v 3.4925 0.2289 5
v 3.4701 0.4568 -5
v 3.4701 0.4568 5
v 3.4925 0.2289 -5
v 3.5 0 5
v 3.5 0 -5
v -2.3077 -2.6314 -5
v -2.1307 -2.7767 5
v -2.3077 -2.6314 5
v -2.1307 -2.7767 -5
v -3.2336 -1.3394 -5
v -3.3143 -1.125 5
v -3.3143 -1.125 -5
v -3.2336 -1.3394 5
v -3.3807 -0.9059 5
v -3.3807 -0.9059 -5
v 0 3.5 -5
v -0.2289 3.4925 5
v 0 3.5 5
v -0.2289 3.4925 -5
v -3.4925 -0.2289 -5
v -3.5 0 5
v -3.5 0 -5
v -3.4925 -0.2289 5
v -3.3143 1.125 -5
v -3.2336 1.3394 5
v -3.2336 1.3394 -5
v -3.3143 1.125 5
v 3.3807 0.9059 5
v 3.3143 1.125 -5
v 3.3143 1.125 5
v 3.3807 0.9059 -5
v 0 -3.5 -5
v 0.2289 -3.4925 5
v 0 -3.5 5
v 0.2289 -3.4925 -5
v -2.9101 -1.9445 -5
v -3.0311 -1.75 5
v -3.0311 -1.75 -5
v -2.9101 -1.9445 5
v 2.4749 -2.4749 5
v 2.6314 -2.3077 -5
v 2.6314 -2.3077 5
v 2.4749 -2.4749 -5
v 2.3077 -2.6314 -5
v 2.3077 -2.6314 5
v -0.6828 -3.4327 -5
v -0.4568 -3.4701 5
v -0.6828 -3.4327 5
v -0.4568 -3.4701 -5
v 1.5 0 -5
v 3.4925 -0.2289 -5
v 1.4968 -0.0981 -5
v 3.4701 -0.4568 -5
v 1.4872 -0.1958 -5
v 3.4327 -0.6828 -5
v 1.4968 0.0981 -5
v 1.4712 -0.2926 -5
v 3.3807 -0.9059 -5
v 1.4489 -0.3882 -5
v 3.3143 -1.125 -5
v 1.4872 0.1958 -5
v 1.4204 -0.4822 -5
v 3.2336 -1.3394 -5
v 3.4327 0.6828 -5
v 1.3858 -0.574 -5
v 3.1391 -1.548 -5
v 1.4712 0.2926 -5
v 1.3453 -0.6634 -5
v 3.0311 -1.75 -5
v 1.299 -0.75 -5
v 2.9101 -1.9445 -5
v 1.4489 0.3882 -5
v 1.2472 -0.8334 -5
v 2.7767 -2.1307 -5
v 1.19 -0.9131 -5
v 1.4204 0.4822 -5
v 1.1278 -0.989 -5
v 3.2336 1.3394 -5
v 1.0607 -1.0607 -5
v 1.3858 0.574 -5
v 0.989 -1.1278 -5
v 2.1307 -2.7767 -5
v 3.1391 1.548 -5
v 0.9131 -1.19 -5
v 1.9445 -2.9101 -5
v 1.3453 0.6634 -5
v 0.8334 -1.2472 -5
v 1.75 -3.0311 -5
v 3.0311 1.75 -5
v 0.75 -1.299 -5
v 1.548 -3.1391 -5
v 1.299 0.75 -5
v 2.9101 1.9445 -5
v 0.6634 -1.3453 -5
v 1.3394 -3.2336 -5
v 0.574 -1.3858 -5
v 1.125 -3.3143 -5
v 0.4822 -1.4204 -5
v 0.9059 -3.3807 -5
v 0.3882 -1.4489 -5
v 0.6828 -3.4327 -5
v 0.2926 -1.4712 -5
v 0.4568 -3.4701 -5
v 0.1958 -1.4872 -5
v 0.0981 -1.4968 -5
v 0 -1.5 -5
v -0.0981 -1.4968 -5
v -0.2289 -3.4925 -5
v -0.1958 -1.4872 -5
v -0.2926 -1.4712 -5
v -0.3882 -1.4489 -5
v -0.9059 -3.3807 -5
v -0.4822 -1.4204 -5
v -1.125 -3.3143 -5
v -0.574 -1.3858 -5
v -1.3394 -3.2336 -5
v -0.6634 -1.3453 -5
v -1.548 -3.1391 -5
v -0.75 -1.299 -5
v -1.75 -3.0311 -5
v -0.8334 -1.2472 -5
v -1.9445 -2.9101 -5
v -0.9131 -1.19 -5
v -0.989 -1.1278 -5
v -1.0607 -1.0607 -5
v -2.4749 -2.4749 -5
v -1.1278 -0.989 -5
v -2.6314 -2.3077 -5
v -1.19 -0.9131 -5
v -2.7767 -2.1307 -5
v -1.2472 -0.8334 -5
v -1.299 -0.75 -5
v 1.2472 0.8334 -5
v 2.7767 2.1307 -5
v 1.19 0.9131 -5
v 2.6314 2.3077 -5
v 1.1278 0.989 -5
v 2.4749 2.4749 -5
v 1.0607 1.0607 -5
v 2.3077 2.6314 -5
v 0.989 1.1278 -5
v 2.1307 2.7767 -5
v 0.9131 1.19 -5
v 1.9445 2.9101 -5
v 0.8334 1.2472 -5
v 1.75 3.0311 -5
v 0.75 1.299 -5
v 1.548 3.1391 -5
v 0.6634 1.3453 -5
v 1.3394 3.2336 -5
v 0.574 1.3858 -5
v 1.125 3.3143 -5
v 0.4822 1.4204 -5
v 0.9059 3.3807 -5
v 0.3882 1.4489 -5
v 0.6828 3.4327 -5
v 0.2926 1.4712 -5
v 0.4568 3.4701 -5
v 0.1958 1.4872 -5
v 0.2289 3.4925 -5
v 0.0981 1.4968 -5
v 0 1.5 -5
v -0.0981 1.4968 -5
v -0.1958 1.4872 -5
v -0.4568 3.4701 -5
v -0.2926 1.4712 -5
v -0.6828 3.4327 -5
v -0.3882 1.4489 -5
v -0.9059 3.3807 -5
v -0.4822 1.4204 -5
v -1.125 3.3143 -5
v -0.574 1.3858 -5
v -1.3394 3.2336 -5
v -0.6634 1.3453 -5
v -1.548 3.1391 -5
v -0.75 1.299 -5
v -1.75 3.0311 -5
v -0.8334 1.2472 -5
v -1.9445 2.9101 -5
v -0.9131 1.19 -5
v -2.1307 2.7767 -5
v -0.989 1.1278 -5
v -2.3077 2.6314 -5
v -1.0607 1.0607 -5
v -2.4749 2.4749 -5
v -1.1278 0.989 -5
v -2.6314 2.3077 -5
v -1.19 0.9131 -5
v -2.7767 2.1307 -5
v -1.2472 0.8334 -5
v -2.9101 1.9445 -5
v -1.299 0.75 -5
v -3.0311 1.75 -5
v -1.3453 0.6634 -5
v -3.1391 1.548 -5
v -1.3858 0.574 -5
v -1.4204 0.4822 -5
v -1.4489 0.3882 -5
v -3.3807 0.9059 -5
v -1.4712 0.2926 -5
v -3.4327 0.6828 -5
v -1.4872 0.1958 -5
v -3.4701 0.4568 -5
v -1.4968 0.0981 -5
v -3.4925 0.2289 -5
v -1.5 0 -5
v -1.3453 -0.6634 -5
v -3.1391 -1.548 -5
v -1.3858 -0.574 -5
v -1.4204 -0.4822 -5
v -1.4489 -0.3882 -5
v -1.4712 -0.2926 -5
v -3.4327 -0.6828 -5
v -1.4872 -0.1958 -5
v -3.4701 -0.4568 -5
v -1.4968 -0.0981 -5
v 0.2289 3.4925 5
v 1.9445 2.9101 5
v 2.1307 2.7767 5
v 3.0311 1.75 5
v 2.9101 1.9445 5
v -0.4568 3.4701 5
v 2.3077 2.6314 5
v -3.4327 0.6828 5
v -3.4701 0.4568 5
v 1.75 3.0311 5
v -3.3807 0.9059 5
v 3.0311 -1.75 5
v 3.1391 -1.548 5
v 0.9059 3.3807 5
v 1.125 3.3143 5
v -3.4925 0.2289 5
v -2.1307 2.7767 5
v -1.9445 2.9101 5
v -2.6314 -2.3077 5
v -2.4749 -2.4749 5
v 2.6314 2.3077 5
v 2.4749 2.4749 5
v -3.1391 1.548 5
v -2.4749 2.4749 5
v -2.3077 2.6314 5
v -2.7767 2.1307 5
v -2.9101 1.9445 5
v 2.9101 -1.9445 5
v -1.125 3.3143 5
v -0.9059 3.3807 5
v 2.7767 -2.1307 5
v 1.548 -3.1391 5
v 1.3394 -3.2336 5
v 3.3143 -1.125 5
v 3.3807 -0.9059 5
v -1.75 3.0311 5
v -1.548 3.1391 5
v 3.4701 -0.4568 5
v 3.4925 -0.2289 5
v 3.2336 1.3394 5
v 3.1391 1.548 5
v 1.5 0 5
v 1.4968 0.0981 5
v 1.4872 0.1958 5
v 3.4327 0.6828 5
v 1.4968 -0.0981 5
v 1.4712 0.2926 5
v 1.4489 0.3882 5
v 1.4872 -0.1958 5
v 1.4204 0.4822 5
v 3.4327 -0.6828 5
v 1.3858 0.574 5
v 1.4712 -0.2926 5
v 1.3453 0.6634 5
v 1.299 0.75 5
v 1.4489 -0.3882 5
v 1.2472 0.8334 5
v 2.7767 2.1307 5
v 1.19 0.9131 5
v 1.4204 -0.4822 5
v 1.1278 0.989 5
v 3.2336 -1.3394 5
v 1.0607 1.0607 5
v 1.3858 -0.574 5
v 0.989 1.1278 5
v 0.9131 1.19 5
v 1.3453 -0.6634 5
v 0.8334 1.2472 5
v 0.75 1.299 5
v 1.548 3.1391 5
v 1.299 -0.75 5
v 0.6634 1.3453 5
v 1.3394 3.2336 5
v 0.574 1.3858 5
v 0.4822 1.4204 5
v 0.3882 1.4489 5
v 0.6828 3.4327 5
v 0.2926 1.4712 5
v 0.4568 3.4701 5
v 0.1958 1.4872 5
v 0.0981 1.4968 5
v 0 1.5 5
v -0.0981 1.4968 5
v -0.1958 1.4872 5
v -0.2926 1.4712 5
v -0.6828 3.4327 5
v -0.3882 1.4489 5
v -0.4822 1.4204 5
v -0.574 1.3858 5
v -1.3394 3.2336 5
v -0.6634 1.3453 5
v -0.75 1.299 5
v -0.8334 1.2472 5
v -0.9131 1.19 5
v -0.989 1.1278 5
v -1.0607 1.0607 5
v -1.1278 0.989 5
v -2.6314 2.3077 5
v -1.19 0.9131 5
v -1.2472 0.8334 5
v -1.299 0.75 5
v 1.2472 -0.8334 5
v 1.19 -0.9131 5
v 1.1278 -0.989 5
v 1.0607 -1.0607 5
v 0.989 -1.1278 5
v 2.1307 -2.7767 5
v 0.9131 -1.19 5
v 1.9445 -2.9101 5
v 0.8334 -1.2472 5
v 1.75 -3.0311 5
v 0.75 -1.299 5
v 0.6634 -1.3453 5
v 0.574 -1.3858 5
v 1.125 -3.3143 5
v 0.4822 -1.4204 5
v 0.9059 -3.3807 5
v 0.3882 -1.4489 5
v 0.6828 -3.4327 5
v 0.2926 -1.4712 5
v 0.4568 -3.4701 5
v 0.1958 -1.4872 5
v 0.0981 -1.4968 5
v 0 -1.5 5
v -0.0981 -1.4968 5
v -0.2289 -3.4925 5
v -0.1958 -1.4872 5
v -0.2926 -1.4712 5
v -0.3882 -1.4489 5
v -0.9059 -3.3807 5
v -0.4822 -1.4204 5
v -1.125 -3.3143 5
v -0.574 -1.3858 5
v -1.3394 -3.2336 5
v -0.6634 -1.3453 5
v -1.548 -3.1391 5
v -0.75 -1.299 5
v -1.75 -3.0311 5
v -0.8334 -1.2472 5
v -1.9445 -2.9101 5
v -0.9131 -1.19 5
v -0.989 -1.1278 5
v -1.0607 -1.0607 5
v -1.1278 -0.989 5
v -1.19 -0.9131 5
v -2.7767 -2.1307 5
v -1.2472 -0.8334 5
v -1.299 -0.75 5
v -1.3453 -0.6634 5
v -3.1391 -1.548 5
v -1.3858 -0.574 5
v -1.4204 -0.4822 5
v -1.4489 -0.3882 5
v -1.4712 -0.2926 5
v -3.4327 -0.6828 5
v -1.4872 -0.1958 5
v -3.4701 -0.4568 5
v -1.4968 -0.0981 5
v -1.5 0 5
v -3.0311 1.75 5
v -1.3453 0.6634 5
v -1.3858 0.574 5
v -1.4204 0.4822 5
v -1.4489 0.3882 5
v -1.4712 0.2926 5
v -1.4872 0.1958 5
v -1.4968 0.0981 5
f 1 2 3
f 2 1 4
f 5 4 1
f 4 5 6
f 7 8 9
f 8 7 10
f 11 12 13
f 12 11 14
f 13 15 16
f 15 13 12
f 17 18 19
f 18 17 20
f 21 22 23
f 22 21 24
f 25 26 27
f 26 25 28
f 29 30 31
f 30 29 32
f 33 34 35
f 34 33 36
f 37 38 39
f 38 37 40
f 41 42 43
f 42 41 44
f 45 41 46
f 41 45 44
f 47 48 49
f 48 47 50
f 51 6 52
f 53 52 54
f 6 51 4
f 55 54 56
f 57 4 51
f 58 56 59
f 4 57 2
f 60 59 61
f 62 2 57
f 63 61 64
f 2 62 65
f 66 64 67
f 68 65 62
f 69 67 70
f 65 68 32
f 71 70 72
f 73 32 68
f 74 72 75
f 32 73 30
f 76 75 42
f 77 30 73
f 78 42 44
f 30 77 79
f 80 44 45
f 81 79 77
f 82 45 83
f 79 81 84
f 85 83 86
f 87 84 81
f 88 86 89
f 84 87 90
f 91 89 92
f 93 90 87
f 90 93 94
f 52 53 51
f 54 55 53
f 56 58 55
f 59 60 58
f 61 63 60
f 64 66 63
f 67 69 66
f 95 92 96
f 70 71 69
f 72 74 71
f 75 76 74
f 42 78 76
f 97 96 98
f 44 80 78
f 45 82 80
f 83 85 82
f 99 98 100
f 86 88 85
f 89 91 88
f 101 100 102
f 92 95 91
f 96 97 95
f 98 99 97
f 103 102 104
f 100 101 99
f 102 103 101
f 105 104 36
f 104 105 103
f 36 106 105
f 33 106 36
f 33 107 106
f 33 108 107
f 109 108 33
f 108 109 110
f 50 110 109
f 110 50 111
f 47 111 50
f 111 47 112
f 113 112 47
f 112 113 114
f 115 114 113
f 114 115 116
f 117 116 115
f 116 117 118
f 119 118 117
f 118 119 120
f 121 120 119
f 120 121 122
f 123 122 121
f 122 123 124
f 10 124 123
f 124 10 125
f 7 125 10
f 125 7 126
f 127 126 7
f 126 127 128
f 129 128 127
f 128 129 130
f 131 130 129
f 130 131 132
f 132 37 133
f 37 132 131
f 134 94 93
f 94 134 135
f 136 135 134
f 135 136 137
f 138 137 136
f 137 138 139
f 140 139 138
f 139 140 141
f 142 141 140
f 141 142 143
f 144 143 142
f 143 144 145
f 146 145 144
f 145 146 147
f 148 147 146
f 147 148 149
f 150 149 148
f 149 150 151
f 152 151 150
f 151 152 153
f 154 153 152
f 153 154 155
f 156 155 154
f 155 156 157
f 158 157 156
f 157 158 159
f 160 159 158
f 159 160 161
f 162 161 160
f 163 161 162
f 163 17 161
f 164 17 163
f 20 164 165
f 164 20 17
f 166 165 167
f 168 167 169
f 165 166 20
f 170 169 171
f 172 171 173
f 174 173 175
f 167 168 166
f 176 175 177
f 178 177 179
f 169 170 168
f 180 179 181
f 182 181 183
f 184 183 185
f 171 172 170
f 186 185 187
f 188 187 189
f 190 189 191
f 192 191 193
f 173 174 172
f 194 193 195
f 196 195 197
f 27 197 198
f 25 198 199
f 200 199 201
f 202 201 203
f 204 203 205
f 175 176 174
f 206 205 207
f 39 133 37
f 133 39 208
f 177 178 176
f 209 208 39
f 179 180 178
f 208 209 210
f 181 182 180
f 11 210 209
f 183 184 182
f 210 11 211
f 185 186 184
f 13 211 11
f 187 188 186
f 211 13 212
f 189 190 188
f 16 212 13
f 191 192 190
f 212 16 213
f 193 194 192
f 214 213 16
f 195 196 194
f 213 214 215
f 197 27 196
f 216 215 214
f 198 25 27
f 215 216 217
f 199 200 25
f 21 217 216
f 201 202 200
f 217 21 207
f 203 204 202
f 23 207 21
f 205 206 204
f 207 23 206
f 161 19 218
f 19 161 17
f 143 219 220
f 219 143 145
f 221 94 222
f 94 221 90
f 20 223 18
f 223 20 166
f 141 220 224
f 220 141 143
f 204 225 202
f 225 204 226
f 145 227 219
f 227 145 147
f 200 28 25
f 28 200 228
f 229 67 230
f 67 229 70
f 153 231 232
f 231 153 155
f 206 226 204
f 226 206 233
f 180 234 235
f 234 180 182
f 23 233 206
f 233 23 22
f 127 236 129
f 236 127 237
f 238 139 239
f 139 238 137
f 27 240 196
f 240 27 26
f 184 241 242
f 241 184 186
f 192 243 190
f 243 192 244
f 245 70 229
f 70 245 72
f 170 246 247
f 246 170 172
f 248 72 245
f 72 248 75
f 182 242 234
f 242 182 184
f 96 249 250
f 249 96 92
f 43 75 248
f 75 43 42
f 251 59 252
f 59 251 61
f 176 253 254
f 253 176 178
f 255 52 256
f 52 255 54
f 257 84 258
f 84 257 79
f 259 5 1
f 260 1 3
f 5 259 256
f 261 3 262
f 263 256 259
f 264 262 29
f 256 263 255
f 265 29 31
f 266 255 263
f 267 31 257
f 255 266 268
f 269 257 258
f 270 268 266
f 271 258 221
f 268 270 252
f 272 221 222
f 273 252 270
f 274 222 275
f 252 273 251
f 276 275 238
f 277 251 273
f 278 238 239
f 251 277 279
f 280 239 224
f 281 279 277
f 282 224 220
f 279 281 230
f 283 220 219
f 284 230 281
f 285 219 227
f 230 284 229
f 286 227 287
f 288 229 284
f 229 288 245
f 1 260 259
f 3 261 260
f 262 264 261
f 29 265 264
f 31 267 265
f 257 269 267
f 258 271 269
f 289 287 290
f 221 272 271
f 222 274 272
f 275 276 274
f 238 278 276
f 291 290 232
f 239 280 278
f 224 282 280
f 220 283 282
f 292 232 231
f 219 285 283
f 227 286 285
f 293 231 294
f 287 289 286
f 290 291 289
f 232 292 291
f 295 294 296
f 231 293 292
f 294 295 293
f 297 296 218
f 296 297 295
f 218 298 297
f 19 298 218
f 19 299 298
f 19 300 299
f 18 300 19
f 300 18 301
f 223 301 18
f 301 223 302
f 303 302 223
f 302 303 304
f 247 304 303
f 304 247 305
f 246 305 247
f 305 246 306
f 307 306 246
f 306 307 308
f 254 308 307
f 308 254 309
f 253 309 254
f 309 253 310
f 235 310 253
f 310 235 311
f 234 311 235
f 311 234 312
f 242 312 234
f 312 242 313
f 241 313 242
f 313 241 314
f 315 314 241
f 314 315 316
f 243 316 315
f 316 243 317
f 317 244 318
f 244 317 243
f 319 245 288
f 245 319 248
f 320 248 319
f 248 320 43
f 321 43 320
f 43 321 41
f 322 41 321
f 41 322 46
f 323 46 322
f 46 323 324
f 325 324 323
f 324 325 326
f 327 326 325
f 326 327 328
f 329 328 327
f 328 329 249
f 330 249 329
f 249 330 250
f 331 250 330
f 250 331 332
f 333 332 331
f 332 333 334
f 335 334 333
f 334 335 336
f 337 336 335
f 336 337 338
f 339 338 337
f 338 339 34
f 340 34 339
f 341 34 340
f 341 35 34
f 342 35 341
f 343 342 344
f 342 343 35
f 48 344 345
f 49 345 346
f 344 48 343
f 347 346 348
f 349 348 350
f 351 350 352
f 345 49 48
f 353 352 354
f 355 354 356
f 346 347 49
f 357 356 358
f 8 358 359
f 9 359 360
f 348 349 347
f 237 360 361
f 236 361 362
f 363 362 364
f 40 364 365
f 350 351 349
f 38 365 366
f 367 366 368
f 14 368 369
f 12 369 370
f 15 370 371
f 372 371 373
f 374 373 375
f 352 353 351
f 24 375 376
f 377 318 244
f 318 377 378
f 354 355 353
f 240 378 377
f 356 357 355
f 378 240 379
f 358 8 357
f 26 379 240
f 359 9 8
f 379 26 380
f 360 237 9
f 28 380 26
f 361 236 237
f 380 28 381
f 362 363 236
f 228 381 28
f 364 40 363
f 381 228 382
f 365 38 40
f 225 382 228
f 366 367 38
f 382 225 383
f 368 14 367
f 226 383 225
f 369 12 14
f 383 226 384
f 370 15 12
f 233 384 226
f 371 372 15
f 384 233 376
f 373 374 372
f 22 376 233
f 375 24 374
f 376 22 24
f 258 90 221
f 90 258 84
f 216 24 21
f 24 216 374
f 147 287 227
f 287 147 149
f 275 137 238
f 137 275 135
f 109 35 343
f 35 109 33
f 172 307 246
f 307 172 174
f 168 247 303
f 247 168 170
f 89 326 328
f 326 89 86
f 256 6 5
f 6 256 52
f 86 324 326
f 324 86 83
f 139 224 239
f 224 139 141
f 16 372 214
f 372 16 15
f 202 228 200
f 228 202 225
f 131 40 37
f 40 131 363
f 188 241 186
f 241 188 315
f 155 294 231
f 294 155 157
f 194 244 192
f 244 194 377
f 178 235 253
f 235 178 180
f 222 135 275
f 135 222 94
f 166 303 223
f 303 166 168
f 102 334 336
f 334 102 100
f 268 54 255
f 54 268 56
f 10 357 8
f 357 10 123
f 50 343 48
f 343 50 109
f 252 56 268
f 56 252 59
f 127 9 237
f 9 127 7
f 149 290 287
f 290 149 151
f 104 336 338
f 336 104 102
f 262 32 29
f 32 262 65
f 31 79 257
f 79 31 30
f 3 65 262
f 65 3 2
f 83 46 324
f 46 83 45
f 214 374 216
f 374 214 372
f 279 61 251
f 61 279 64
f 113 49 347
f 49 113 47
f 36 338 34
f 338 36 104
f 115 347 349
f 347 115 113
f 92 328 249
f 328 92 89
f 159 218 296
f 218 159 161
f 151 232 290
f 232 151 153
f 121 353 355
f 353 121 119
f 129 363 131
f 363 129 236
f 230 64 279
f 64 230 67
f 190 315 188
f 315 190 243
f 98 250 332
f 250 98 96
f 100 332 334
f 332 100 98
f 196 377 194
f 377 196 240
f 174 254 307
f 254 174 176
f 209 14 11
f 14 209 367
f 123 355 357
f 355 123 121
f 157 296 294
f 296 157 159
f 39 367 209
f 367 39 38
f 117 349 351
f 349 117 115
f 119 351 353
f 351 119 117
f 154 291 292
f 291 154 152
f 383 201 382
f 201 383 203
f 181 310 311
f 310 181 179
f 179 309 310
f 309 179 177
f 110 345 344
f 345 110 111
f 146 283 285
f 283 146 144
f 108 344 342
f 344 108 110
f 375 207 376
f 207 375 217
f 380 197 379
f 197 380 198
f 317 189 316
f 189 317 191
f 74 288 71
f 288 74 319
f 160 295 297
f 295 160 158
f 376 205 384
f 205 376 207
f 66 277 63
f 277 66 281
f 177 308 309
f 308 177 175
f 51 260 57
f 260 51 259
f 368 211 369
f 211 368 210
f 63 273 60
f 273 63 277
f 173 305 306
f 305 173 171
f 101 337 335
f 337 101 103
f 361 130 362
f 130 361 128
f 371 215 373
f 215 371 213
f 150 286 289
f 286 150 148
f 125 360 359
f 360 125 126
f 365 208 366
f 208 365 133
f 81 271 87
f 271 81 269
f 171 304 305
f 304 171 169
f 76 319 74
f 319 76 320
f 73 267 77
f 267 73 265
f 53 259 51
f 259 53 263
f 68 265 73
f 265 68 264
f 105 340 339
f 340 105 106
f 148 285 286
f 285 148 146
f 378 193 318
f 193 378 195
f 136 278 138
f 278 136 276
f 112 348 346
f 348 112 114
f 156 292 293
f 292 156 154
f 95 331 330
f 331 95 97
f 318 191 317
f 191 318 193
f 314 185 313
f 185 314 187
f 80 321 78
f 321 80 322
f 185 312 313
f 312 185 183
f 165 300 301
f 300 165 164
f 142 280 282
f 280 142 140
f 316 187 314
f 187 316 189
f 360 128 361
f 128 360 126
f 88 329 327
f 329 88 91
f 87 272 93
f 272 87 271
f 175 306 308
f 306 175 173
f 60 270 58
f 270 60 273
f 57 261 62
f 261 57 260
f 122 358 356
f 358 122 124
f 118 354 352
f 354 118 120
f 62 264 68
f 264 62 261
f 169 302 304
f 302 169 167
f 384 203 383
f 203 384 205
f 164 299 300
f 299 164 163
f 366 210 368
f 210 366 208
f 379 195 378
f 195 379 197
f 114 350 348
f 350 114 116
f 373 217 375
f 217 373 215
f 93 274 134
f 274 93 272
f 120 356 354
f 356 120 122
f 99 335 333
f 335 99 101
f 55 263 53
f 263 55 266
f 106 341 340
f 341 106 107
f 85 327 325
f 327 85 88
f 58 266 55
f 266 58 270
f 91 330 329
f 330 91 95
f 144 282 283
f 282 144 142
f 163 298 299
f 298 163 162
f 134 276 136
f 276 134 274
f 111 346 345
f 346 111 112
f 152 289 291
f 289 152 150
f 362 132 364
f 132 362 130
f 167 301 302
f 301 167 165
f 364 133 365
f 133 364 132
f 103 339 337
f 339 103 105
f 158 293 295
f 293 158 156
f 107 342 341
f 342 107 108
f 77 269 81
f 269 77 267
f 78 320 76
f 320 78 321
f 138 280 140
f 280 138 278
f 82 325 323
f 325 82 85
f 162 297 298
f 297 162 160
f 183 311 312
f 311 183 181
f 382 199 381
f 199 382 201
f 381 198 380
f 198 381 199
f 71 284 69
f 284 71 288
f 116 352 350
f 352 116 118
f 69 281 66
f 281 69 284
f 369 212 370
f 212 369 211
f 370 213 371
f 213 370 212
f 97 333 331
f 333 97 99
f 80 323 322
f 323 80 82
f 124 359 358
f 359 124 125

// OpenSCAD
$fn=96;

bore_d = 3.0;
od_d = 7.0;
len = 10.0;

module linear_bearing(bore_d, od_d, len){
    difference(){
        cylinder(d=od_d, h=len, center=true);
        cylinder(d=bore_d, h=len+0.2, center=true);
    }
}

linear_bearing(bore_d, od_d, len);
